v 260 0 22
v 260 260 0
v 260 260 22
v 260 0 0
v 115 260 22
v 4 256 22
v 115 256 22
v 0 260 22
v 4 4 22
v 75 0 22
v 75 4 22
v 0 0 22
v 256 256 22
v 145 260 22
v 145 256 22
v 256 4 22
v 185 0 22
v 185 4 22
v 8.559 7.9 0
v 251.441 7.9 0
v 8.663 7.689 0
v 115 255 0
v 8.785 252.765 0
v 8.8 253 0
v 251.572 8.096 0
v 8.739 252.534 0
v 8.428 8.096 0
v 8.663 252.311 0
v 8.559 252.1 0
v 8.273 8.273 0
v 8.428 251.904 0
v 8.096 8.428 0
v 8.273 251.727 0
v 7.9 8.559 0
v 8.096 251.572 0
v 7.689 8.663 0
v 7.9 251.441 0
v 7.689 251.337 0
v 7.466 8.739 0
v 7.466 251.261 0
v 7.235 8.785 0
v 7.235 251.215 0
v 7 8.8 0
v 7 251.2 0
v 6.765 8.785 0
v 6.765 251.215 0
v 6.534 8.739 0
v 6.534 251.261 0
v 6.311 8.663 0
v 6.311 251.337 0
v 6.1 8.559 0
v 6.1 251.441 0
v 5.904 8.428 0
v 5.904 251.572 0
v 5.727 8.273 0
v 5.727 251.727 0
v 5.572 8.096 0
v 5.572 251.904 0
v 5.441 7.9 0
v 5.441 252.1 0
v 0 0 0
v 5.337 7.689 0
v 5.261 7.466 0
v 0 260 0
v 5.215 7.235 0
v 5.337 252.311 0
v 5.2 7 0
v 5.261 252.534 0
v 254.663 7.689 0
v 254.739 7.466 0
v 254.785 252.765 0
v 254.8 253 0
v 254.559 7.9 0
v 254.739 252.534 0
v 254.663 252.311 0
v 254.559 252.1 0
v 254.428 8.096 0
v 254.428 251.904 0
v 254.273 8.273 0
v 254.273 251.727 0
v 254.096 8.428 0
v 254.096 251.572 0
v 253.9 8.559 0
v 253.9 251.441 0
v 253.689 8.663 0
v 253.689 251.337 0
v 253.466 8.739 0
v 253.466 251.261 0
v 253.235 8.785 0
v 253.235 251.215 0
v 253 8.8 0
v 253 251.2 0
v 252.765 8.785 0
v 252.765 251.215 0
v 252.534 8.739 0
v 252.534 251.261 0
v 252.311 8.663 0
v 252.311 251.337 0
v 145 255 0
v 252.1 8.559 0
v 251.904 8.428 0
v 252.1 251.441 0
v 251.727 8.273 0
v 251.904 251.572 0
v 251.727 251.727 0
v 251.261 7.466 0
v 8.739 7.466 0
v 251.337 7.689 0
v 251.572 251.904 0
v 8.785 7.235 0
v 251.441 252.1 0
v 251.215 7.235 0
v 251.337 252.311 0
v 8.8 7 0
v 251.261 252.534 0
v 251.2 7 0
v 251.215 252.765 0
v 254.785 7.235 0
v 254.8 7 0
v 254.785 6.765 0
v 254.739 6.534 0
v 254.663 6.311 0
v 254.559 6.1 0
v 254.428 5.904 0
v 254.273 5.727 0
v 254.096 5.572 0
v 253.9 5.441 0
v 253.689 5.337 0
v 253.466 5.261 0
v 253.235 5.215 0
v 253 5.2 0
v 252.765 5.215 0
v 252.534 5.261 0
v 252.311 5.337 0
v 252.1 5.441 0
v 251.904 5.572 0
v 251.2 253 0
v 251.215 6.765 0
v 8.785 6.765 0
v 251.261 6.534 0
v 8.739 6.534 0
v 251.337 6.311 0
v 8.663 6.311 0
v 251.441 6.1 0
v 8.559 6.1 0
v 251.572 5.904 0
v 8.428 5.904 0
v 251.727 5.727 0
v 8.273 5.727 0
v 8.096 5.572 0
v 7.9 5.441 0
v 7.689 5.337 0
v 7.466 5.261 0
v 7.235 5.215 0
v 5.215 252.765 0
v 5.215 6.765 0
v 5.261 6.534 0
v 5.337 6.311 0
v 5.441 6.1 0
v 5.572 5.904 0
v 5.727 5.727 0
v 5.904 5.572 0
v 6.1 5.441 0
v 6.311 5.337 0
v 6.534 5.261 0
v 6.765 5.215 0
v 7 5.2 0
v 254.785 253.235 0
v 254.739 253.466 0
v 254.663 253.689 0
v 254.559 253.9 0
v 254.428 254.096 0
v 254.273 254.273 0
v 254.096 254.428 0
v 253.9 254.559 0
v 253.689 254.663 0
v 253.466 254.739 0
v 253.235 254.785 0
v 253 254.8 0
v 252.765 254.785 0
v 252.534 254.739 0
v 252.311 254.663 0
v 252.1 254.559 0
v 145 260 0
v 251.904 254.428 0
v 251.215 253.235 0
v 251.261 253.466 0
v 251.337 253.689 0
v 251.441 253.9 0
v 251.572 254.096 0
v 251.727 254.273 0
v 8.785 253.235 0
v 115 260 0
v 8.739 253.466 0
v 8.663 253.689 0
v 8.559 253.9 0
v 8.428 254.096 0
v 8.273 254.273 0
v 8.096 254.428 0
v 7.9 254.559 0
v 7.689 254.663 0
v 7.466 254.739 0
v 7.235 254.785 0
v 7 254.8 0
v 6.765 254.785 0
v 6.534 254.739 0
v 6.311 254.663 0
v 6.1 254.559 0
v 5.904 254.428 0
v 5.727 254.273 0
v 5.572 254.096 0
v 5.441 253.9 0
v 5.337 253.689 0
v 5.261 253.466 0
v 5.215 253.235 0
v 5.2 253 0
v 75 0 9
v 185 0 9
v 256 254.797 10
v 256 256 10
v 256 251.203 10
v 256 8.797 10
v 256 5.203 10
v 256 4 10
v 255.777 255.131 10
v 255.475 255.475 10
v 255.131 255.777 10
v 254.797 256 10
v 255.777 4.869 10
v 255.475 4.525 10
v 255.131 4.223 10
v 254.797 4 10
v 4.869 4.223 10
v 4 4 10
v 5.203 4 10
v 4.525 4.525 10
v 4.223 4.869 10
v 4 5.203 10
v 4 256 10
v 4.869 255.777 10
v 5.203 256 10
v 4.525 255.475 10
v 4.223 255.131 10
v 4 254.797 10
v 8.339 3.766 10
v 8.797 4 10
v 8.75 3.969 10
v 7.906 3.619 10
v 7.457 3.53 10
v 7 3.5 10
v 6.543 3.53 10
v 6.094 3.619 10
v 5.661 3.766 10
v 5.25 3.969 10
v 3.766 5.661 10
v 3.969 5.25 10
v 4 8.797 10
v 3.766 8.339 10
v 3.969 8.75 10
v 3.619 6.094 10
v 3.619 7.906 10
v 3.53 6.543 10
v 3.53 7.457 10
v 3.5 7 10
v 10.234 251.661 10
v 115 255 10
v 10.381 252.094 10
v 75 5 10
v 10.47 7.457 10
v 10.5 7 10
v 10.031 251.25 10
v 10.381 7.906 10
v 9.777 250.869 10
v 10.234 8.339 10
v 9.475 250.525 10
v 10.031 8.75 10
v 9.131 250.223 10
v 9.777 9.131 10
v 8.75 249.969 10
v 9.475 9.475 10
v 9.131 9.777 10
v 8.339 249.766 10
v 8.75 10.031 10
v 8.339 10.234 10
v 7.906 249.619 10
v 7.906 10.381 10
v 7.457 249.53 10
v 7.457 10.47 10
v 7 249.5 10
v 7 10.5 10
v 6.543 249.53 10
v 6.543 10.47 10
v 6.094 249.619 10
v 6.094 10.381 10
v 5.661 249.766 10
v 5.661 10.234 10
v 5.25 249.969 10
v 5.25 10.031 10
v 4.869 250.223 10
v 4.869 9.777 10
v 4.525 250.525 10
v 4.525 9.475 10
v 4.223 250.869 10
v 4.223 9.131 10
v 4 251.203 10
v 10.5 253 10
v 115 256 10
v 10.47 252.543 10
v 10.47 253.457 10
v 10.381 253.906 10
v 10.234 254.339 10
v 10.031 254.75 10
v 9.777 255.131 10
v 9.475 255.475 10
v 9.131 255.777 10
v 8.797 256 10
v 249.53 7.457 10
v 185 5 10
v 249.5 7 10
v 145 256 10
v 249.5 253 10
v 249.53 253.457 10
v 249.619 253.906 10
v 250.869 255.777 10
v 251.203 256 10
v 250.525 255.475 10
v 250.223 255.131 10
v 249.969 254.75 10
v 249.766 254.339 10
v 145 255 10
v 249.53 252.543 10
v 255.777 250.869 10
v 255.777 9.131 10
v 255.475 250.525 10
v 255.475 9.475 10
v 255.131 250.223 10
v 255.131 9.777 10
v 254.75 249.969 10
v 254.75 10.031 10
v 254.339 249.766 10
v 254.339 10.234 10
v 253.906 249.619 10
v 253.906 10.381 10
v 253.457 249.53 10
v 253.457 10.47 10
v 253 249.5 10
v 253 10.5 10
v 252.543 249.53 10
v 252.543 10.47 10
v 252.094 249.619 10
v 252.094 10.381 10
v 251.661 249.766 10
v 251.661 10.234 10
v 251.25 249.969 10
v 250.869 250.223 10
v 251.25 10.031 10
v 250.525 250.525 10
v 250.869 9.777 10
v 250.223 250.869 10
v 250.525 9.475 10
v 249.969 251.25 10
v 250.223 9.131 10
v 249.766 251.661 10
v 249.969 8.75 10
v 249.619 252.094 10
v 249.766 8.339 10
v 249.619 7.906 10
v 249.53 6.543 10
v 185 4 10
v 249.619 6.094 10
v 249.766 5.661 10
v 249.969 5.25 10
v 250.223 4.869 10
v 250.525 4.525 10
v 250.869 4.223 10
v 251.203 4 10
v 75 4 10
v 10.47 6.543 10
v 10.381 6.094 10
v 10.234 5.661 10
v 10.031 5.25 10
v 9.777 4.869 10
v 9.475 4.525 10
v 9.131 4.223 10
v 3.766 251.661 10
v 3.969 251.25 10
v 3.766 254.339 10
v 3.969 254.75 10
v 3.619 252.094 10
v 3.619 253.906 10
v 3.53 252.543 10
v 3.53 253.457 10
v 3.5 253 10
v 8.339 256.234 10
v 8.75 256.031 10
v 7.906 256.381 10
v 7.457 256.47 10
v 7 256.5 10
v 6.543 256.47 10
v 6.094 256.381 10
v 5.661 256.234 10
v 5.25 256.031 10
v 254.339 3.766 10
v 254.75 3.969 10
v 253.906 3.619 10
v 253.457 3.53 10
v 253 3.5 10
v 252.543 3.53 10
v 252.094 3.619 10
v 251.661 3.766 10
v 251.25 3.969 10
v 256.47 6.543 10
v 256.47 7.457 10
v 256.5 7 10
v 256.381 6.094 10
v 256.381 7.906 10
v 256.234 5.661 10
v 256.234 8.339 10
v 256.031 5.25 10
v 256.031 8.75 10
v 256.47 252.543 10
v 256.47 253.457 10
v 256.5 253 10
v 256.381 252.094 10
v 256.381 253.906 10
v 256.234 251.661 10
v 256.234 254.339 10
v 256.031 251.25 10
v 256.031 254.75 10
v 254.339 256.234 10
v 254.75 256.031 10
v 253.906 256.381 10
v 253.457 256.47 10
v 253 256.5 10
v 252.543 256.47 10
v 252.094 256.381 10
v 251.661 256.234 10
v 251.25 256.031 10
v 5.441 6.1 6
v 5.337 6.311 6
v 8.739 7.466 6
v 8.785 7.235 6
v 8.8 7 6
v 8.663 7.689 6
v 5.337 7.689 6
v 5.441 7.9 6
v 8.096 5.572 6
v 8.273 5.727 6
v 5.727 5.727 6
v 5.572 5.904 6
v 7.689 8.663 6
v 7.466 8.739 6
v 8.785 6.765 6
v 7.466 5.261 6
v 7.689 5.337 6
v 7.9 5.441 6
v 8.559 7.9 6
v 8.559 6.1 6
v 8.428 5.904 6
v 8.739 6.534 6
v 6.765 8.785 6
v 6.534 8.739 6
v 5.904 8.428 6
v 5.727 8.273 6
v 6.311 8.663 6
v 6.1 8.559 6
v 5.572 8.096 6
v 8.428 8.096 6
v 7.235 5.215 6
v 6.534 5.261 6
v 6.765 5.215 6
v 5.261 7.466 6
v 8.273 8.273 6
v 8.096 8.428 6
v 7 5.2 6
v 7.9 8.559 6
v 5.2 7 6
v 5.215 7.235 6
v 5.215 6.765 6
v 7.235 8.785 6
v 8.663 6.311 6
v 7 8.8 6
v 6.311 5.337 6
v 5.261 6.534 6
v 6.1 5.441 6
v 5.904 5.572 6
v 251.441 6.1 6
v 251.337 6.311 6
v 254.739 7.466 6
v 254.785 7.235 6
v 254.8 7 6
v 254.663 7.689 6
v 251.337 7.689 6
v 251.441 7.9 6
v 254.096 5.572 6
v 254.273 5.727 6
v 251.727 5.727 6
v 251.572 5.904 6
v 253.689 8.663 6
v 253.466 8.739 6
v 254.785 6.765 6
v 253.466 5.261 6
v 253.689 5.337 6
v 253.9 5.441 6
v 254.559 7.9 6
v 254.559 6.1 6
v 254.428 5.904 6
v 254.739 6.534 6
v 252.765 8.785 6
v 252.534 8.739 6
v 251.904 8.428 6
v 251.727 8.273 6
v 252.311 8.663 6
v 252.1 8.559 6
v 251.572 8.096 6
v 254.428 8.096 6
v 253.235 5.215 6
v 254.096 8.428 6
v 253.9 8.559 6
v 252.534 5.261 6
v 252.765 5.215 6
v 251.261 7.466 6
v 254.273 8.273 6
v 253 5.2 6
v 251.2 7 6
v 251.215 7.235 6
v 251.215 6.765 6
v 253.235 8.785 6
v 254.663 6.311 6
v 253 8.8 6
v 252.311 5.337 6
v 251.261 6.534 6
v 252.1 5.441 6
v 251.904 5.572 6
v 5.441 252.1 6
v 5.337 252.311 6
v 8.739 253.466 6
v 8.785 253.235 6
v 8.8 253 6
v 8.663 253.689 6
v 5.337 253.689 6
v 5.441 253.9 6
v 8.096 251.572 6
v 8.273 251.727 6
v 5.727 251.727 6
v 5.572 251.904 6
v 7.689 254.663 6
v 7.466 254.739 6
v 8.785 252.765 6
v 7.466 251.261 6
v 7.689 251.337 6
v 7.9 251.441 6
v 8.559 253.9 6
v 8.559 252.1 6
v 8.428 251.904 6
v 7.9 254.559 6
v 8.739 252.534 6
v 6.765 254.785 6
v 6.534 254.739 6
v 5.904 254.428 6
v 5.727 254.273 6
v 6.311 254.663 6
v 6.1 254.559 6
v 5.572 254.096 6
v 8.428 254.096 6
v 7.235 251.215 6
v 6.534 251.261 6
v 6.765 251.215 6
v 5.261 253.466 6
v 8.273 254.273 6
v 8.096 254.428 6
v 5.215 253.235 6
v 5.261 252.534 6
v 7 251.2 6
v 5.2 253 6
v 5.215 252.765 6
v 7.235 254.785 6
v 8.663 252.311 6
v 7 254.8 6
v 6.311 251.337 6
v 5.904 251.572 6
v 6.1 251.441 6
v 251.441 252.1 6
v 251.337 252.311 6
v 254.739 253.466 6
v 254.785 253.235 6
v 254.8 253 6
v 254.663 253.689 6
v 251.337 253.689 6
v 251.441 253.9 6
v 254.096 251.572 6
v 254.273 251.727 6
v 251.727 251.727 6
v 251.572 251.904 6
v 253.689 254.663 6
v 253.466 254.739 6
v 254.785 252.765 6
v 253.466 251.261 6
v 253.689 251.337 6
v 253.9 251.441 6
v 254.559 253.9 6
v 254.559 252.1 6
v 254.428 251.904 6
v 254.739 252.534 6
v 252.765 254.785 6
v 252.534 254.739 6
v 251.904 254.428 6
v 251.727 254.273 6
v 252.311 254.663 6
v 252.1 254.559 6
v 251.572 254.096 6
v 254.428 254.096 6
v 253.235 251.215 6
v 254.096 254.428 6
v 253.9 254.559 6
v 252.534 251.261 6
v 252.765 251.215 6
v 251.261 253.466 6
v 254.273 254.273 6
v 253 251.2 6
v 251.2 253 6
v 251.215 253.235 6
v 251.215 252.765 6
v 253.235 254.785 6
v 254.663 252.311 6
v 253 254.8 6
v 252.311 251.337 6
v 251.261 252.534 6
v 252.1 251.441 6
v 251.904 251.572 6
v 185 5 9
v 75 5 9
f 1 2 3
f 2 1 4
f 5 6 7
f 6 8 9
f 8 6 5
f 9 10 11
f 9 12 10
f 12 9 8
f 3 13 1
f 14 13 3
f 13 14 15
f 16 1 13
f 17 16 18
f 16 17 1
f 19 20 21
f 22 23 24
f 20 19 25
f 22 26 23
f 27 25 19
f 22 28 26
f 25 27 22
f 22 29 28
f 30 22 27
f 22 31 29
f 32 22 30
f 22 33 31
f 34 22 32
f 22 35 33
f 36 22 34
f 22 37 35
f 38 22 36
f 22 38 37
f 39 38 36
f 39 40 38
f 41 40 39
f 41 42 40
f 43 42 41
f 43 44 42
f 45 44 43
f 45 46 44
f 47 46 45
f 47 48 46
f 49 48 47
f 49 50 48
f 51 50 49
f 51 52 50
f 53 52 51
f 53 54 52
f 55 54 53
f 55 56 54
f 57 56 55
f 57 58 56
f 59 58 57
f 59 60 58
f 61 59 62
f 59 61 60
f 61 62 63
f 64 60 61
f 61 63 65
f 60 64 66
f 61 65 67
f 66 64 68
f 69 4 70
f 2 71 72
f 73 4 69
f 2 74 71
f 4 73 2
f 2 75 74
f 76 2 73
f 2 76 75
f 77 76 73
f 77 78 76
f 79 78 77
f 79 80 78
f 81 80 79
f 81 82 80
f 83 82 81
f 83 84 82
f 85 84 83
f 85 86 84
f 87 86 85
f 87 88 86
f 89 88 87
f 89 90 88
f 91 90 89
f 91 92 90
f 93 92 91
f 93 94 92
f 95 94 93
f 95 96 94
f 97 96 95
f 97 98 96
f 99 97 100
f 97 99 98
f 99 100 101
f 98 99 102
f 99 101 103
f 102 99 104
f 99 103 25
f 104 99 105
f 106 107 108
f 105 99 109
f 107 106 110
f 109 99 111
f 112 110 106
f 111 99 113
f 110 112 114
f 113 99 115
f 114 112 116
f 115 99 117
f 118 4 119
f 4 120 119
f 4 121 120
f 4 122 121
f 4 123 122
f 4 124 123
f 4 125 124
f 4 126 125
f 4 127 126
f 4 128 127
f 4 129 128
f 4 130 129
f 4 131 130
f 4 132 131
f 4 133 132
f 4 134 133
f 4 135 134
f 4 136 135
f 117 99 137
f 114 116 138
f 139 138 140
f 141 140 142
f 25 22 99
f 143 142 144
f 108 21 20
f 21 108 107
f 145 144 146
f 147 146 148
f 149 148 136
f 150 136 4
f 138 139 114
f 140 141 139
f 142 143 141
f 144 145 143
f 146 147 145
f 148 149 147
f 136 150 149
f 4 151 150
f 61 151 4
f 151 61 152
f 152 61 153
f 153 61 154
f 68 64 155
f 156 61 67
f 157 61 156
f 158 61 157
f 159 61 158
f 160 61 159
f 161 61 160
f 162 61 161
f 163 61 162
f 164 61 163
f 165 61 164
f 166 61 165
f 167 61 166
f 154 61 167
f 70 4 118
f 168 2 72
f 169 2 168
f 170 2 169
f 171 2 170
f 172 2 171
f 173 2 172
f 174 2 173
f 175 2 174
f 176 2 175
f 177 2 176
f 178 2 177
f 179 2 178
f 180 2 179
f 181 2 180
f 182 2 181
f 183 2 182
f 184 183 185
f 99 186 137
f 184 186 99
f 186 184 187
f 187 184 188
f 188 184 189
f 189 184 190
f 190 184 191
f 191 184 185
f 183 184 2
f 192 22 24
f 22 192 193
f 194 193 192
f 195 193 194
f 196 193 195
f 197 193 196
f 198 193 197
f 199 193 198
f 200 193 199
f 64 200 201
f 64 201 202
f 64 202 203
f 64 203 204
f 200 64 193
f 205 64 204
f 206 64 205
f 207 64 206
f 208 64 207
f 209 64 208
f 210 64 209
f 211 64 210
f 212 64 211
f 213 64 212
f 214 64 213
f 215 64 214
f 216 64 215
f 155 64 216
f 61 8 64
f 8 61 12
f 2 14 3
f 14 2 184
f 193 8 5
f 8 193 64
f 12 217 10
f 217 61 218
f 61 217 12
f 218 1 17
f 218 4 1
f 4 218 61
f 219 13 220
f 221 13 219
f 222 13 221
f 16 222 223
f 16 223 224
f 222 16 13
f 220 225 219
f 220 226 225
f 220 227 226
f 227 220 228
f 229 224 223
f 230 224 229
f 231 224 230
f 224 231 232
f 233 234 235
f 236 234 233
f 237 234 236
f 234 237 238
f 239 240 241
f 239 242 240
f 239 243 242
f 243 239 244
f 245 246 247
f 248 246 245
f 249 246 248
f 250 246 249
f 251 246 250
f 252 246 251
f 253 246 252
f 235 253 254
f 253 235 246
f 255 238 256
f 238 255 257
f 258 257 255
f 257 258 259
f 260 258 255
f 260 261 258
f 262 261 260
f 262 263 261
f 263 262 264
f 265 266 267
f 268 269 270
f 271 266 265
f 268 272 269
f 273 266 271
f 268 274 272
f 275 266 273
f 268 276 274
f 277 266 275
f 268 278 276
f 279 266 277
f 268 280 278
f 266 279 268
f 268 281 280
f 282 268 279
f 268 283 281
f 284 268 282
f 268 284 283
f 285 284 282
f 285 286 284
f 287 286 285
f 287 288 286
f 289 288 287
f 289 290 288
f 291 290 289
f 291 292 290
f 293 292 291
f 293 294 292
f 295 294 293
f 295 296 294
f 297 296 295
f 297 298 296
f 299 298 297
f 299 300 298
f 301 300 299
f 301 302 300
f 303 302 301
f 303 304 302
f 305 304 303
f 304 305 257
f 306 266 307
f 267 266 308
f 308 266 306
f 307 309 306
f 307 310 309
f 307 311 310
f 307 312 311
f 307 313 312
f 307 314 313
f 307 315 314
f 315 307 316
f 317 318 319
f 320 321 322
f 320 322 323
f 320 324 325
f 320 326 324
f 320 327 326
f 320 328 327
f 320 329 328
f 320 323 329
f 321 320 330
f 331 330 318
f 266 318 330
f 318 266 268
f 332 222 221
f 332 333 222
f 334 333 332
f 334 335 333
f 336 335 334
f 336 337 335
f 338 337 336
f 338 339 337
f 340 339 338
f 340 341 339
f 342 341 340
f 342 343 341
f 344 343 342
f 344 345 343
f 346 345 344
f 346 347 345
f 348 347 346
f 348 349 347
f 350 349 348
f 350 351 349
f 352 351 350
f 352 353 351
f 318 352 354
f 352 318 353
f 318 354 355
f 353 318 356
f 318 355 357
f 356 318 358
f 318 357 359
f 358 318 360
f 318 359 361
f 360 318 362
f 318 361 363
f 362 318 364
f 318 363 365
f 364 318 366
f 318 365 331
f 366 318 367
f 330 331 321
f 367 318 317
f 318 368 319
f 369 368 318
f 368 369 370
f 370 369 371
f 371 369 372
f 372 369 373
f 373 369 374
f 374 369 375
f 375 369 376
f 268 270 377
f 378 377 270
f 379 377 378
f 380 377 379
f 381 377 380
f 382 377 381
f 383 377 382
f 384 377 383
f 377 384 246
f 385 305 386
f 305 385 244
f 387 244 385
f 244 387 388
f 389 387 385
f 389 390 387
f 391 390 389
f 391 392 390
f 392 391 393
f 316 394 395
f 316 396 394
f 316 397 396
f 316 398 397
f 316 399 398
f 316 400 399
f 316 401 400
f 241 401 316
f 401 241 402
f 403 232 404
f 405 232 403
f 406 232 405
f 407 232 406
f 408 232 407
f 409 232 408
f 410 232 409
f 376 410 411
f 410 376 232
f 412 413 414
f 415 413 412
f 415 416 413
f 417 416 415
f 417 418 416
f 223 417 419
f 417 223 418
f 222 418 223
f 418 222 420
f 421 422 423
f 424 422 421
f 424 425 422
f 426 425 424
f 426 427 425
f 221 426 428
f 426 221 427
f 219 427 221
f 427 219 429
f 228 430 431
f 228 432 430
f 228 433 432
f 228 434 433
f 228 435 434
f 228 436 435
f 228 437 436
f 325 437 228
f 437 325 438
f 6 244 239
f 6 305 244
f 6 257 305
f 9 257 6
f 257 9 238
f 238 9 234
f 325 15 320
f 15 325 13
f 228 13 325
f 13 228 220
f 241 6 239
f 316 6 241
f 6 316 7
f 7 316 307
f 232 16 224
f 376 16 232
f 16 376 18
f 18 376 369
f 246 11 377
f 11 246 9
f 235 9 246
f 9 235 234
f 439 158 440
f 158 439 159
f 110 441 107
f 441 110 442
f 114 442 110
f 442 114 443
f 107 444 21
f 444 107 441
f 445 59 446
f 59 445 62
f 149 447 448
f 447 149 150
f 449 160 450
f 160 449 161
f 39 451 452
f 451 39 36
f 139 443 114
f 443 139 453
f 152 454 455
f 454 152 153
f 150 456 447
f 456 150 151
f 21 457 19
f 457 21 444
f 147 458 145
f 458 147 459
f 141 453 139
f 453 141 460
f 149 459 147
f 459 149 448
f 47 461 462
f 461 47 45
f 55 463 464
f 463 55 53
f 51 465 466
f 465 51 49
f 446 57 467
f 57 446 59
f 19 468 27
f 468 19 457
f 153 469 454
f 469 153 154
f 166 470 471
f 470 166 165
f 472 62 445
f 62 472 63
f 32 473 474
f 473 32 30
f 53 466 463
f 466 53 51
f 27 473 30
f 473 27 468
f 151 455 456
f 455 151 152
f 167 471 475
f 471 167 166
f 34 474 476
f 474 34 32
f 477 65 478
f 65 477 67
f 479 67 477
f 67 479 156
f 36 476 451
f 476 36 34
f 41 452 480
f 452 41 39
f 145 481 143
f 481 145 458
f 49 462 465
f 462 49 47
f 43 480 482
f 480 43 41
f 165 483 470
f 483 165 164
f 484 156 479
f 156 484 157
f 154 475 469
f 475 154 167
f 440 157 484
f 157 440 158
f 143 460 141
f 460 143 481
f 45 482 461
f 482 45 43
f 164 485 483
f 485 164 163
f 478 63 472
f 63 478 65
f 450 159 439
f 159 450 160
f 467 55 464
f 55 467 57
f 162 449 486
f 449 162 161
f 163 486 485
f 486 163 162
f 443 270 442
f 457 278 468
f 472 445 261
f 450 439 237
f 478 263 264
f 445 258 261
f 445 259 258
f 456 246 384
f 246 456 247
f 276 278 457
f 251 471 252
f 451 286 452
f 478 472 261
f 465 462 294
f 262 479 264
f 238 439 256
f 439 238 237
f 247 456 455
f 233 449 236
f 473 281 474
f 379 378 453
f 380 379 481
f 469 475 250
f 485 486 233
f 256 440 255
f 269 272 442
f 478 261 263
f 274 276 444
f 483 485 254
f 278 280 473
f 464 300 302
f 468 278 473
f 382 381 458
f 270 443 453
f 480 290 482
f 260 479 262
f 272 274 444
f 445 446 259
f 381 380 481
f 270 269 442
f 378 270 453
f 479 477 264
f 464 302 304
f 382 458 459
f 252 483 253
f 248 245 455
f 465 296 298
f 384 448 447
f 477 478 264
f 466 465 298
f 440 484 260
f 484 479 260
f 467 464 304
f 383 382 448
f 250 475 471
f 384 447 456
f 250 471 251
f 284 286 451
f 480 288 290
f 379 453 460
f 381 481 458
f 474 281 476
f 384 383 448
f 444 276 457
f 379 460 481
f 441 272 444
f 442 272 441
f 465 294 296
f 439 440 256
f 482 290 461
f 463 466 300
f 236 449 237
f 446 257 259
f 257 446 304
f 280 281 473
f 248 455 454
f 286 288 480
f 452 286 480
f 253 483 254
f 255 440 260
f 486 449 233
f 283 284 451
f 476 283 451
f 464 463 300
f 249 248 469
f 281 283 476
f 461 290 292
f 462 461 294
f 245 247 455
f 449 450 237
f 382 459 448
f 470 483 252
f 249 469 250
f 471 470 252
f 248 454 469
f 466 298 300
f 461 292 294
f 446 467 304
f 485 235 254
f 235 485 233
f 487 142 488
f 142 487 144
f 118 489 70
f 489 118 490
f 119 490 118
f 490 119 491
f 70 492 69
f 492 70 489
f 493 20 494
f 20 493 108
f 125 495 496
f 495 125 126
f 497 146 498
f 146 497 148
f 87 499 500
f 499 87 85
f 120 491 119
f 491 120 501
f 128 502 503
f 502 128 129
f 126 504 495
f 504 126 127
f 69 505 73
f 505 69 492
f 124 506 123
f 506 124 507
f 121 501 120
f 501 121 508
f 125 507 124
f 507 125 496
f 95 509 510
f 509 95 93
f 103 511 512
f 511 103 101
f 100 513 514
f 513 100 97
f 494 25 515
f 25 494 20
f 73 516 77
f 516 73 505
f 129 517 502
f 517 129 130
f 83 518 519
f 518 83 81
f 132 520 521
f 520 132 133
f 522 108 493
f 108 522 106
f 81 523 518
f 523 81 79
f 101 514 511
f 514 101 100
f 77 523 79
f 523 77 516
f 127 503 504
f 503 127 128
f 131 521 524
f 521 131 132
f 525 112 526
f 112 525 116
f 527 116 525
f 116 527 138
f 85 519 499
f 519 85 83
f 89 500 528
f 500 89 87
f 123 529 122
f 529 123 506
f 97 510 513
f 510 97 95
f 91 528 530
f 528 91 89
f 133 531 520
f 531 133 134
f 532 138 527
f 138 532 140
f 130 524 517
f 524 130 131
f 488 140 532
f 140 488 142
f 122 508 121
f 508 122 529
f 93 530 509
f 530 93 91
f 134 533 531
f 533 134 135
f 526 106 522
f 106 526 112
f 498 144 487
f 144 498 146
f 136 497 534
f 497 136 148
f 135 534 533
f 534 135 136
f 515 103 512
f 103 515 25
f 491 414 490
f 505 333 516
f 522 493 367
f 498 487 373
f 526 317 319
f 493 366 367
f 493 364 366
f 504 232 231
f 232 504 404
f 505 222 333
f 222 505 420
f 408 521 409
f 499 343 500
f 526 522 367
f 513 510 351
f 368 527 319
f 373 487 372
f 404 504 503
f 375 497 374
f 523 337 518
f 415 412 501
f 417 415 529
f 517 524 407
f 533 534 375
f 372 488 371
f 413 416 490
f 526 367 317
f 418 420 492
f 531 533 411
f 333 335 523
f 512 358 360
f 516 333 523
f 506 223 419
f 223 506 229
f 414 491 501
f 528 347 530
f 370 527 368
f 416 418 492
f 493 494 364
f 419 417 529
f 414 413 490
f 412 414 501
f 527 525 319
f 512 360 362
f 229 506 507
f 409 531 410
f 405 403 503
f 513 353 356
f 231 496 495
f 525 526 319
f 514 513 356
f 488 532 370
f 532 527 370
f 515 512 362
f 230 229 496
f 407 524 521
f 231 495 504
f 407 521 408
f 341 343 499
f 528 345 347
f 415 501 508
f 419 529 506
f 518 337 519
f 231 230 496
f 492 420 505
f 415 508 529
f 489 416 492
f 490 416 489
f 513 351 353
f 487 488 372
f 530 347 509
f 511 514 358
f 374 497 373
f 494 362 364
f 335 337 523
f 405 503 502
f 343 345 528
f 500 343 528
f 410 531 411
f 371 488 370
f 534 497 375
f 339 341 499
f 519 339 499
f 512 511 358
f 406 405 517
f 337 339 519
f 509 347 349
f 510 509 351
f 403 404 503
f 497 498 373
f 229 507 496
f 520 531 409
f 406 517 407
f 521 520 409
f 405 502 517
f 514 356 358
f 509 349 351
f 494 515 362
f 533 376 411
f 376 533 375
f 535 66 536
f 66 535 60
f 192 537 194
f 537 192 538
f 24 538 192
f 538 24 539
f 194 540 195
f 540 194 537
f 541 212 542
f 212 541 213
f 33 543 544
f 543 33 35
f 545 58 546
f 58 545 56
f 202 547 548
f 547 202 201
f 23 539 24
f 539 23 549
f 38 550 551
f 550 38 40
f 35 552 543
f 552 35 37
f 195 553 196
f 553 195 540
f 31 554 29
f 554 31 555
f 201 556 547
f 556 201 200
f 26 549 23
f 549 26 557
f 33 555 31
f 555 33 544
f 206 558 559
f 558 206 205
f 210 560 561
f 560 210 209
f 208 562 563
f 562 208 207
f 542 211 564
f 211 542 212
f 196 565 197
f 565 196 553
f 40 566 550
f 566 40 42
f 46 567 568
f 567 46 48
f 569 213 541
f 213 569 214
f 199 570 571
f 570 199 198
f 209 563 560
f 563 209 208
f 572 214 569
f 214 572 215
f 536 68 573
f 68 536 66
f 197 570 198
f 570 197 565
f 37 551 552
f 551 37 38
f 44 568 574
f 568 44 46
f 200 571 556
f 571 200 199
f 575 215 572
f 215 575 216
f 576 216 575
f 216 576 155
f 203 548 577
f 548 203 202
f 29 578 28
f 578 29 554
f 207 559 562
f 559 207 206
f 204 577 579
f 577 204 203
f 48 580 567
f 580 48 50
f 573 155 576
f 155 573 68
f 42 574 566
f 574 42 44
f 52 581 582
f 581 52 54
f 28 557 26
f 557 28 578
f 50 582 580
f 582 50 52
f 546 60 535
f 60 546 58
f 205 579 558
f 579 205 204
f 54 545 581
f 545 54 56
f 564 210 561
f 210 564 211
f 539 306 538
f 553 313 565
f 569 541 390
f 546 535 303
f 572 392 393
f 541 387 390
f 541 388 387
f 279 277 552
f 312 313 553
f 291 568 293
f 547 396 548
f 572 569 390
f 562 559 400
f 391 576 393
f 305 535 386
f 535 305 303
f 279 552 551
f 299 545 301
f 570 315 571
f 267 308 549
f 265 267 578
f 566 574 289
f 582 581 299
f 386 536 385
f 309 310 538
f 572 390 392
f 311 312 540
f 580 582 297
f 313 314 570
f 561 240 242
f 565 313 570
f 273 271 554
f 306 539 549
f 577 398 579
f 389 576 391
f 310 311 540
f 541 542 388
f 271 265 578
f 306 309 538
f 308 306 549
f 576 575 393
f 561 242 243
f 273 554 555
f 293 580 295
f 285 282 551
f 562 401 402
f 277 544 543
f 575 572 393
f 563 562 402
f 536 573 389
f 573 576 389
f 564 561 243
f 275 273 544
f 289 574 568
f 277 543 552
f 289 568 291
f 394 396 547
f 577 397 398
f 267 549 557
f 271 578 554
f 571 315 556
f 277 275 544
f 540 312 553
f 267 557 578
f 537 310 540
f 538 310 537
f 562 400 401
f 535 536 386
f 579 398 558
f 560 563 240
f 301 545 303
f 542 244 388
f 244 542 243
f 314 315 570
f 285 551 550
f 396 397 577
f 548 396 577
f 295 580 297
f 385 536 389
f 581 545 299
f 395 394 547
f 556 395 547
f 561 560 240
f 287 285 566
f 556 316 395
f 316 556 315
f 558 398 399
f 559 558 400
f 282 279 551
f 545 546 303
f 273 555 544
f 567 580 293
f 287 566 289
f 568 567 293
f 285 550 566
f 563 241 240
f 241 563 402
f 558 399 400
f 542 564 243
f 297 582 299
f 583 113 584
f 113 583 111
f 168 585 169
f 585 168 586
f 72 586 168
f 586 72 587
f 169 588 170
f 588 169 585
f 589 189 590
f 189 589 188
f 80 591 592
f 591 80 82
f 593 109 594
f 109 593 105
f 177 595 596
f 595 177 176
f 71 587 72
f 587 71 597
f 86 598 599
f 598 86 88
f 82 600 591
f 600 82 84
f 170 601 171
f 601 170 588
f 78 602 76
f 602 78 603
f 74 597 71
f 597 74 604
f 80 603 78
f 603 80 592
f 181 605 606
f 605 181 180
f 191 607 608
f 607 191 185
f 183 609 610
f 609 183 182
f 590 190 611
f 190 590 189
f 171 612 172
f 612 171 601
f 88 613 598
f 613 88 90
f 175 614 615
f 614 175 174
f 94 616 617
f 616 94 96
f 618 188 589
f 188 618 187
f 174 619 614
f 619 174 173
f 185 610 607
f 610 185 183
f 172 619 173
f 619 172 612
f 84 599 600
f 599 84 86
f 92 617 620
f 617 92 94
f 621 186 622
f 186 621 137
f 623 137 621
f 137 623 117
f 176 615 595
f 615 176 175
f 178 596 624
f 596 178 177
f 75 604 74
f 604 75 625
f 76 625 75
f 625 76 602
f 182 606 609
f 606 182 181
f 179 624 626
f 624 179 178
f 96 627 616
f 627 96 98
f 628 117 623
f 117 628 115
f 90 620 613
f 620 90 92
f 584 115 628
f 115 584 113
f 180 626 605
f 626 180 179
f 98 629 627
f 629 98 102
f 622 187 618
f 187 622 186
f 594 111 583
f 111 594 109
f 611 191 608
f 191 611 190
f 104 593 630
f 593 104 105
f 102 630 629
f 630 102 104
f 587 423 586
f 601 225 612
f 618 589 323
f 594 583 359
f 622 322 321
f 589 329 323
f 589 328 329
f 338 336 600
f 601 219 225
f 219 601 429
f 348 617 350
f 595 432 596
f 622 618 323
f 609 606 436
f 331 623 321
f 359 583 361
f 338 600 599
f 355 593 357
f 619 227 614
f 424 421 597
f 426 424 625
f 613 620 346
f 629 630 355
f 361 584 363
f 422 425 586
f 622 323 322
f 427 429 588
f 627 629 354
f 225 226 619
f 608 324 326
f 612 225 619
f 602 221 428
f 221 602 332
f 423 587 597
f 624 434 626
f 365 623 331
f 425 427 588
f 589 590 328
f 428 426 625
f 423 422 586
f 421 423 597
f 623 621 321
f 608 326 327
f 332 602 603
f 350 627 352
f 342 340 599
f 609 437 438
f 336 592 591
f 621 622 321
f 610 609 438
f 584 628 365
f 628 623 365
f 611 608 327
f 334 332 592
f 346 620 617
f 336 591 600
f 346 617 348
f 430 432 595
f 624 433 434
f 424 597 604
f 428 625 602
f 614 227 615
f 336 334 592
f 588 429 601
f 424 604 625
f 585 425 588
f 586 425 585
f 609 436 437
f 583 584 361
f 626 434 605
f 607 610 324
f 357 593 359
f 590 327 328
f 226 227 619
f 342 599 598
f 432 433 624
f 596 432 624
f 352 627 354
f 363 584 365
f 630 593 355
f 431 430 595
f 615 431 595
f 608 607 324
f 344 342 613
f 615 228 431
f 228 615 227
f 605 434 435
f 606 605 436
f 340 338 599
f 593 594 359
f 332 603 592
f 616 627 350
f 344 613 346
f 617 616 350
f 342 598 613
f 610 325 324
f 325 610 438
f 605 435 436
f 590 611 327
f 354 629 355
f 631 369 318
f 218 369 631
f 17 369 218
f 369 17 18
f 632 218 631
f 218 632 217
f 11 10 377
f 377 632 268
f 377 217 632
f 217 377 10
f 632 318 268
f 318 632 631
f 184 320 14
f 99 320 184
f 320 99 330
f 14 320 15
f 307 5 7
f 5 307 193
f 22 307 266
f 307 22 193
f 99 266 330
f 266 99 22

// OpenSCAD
// file: drybox_splitter_stand_common.scad
// drybox_splitter_stand_common.scad — shared library for the two-part stand.
//
// Raises the PolyDryer splitter assembly (dryer + splitter mod + two boxes)
// ~4.5" off the desk with Gridfinity storage underneath. Two parts because the
// dryer sits in the middle of the assembly, so the top must be a solid platform
// — which can't share a single bottom-up print with a hollow storage cubby.
//
//   stand_base()  — Gridfinity storage cubby (open top + front). Prints as-is.
//   stand_top()   — solid platform + lip. Prints flat (solid face down, lip up).
//
// Variants `drybox_splitter_stand_base.scad` / `_top.scad` `include` this file.

/* [Grid] */
gx = 6; gy = 6;

/* [Dimensions] */
wall_t      = 4;
base_wall_h = 104;   // storage walls; + plate_t = assembly-bottom height (≈ 4.5")
plate_t     = 10;    // solid top platform thickness
post        = 14;    // corner post (square) — takes the screws
sill_h      = 12;    // low front sill to retain bins
lip_h       = 12;    // retaining lip around the assembly on the top plate
lip_w       = 4;     // lip thickness
disp_w      = 110;   // front display notch in the lip
cable_w     = 30;    // back cable notch
pilot_d     = 2.8;   // self-tapping pilot in the posts (M3)
screw_d     = 3.6;   // clearance hole in the plate
screw_head  = 7;     // countersink diameter

$fn = 48;

// ---- Gridfinity baseplate (per spec; prints sockets-up on the bed) ----
GF = 42; GF_FILLET = 4; GF_C_TOP = 2.15; GF_C_MID = 1.8; GF_C_BOT = 0.7;
GF_LIP = GF_C_TOP + GF_C_MID + GF_C_BOT; GF_FLOOR = 1.2; GF_H = GF_LIP + GF_FLOOR;
module gf_cell_2d(inset = 0) {
    offset(r = -inset) offset(r = GF_FILLET) offset(r = -GF_FILLET) square(GF, center = true);
}
module gf_socket() {
    eps = 0.01;
    hull() {
        translate([0, 0, GF_H - eps]) linear_extrude(eps) gf_cell_2d(0);
        translate([0, 0, GF_H - GF_C_TOP]) linear_extrude(eps) gf_cell_2d(GF_C_TOP);
    }
    translate([0, 0, GF_H - GF_C_TOP - GF_C_MID]) linear_extrude(GF_C_MID) gf_cell_2d(GF_C_TOP);
    hull() {
        translate([0, 0, GF_H - GF_C_TOP - GF_C_MID - eps]) linear_extrude(eps) gf_cell_2d(GF_C_TOP);
        translate([0, 0, GF_H - GF_LIP]) linear_extrude(eps) gf_cell_2d(GF_C_TOP + GF_C_BOT);
    }
}
module gridfinity_baseplate(nx, ny) {
    w = nx * GF; d = ny * GF;
    difference() {
        translate([0, 0, GF_H / 2]) linear_extrude(GF_H, center = true)
            offset(r = GF_FILLET) offset(r = -GF_FILLET) square([w, d], center = true);
        for (ix = [0 : nx - 1], iy = [0 : ny - 1])
            translate([(ix - (nx - 1) / 2) * GF, (iy - (ny - 1) / 2) * GF, 0]) gf_socket();
    }
}

// ---- Shared geometry ----
bp_w = gx * GF; bp_d = gy * GF;
outer_w = bp_w + 2 * wall_t;     // 260
outer_d = bp_d + 2 * wall_t;
posts = [[post/2, post/2], [outer_w - post/2, post/2],
         [post/2, outer_d - post/2], [outer_w - post/2, outer_d - post/2]];

module stand_base() {
    difference() {
        union() {
            translate([outer_w/2, outer_d/2, 0]) gridfinity_baseplate(gx, gy);    // floor
            cube([wall_t, outer_d, base_wall_h]);                                 // left wall
            translate([outer_w - wall_t, 0, 0]) cube([wall_t, outer_d, base_wall_h]); // right wall
            translate([0, outer_d - wall_t, 0]) cube([outer_w, wall_t, base_wall_h]); // back wall
            cube([outer_w, wall_t, sill_h]);                                      // front sill
            for (p = posts) translate([p[0] - post/2, p[1] - post/2, 0]) cube([post, post, base_wall_h]); // posts
        }
        for (p = posts) translate([p[0], p[1], base_wall_h - 16]) cylinder(h = 18, d = pilot_d); // pilots
    }
}

module stand_top() {
    difference() {
        union() {
            cube([outer_w, outer_d, plate_t]);                                    // platform
            difference() {                                                        // retaining lip
                cube([outer_w, outer_d, plate_t + lip_h]);
                translate([lip_w, lip_w, plate_t]) cube([outer_w - 2*lip_w, outer_d - 2*lip_w, lip_h + 1]);
            }
        }
        for (p = posts) translate([p[0], p[1], -1]) {
            cylinder(h = plate_t + 2, d = screw_d);                               // clearance
            translate([0, 0, plate_t - 3]) cylinder(h = 4, d1 = screw_d, d2 = screw_head); // countersink
        }
        translate([(outer_w - disp_w)/2, -1, plate_t - 1]) cube([disp_w, lip_w + 2, lip_h + 2]);          // display notch
        translate([(outer_w - cable_w)/2, outer_d - lip_w - 1, -1]) cube([cable_w, lip_w + 2, plate_t + lip_h + 2]); // cable notch
    }
}
// main file
// drybox_splitter_stand_top — solid platform + retaining lip. Prints flat.
// Render: openscad -o ..._top.stl --export-format binstl drybox_splitter_stand_top.scad
include <drybox_splitter_stand_common.scad>

stand_top();
